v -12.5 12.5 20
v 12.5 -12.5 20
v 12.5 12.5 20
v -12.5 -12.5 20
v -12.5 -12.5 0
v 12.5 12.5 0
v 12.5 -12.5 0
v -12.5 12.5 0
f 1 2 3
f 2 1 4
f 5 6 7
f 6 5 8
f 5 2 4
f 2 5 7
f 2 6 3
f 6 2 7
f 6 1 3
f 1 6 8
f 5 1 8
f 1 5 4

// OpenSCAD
$fn=64;
translate(v = [-12.500, -12.500])
cube(size = [25, 25, 20]);
